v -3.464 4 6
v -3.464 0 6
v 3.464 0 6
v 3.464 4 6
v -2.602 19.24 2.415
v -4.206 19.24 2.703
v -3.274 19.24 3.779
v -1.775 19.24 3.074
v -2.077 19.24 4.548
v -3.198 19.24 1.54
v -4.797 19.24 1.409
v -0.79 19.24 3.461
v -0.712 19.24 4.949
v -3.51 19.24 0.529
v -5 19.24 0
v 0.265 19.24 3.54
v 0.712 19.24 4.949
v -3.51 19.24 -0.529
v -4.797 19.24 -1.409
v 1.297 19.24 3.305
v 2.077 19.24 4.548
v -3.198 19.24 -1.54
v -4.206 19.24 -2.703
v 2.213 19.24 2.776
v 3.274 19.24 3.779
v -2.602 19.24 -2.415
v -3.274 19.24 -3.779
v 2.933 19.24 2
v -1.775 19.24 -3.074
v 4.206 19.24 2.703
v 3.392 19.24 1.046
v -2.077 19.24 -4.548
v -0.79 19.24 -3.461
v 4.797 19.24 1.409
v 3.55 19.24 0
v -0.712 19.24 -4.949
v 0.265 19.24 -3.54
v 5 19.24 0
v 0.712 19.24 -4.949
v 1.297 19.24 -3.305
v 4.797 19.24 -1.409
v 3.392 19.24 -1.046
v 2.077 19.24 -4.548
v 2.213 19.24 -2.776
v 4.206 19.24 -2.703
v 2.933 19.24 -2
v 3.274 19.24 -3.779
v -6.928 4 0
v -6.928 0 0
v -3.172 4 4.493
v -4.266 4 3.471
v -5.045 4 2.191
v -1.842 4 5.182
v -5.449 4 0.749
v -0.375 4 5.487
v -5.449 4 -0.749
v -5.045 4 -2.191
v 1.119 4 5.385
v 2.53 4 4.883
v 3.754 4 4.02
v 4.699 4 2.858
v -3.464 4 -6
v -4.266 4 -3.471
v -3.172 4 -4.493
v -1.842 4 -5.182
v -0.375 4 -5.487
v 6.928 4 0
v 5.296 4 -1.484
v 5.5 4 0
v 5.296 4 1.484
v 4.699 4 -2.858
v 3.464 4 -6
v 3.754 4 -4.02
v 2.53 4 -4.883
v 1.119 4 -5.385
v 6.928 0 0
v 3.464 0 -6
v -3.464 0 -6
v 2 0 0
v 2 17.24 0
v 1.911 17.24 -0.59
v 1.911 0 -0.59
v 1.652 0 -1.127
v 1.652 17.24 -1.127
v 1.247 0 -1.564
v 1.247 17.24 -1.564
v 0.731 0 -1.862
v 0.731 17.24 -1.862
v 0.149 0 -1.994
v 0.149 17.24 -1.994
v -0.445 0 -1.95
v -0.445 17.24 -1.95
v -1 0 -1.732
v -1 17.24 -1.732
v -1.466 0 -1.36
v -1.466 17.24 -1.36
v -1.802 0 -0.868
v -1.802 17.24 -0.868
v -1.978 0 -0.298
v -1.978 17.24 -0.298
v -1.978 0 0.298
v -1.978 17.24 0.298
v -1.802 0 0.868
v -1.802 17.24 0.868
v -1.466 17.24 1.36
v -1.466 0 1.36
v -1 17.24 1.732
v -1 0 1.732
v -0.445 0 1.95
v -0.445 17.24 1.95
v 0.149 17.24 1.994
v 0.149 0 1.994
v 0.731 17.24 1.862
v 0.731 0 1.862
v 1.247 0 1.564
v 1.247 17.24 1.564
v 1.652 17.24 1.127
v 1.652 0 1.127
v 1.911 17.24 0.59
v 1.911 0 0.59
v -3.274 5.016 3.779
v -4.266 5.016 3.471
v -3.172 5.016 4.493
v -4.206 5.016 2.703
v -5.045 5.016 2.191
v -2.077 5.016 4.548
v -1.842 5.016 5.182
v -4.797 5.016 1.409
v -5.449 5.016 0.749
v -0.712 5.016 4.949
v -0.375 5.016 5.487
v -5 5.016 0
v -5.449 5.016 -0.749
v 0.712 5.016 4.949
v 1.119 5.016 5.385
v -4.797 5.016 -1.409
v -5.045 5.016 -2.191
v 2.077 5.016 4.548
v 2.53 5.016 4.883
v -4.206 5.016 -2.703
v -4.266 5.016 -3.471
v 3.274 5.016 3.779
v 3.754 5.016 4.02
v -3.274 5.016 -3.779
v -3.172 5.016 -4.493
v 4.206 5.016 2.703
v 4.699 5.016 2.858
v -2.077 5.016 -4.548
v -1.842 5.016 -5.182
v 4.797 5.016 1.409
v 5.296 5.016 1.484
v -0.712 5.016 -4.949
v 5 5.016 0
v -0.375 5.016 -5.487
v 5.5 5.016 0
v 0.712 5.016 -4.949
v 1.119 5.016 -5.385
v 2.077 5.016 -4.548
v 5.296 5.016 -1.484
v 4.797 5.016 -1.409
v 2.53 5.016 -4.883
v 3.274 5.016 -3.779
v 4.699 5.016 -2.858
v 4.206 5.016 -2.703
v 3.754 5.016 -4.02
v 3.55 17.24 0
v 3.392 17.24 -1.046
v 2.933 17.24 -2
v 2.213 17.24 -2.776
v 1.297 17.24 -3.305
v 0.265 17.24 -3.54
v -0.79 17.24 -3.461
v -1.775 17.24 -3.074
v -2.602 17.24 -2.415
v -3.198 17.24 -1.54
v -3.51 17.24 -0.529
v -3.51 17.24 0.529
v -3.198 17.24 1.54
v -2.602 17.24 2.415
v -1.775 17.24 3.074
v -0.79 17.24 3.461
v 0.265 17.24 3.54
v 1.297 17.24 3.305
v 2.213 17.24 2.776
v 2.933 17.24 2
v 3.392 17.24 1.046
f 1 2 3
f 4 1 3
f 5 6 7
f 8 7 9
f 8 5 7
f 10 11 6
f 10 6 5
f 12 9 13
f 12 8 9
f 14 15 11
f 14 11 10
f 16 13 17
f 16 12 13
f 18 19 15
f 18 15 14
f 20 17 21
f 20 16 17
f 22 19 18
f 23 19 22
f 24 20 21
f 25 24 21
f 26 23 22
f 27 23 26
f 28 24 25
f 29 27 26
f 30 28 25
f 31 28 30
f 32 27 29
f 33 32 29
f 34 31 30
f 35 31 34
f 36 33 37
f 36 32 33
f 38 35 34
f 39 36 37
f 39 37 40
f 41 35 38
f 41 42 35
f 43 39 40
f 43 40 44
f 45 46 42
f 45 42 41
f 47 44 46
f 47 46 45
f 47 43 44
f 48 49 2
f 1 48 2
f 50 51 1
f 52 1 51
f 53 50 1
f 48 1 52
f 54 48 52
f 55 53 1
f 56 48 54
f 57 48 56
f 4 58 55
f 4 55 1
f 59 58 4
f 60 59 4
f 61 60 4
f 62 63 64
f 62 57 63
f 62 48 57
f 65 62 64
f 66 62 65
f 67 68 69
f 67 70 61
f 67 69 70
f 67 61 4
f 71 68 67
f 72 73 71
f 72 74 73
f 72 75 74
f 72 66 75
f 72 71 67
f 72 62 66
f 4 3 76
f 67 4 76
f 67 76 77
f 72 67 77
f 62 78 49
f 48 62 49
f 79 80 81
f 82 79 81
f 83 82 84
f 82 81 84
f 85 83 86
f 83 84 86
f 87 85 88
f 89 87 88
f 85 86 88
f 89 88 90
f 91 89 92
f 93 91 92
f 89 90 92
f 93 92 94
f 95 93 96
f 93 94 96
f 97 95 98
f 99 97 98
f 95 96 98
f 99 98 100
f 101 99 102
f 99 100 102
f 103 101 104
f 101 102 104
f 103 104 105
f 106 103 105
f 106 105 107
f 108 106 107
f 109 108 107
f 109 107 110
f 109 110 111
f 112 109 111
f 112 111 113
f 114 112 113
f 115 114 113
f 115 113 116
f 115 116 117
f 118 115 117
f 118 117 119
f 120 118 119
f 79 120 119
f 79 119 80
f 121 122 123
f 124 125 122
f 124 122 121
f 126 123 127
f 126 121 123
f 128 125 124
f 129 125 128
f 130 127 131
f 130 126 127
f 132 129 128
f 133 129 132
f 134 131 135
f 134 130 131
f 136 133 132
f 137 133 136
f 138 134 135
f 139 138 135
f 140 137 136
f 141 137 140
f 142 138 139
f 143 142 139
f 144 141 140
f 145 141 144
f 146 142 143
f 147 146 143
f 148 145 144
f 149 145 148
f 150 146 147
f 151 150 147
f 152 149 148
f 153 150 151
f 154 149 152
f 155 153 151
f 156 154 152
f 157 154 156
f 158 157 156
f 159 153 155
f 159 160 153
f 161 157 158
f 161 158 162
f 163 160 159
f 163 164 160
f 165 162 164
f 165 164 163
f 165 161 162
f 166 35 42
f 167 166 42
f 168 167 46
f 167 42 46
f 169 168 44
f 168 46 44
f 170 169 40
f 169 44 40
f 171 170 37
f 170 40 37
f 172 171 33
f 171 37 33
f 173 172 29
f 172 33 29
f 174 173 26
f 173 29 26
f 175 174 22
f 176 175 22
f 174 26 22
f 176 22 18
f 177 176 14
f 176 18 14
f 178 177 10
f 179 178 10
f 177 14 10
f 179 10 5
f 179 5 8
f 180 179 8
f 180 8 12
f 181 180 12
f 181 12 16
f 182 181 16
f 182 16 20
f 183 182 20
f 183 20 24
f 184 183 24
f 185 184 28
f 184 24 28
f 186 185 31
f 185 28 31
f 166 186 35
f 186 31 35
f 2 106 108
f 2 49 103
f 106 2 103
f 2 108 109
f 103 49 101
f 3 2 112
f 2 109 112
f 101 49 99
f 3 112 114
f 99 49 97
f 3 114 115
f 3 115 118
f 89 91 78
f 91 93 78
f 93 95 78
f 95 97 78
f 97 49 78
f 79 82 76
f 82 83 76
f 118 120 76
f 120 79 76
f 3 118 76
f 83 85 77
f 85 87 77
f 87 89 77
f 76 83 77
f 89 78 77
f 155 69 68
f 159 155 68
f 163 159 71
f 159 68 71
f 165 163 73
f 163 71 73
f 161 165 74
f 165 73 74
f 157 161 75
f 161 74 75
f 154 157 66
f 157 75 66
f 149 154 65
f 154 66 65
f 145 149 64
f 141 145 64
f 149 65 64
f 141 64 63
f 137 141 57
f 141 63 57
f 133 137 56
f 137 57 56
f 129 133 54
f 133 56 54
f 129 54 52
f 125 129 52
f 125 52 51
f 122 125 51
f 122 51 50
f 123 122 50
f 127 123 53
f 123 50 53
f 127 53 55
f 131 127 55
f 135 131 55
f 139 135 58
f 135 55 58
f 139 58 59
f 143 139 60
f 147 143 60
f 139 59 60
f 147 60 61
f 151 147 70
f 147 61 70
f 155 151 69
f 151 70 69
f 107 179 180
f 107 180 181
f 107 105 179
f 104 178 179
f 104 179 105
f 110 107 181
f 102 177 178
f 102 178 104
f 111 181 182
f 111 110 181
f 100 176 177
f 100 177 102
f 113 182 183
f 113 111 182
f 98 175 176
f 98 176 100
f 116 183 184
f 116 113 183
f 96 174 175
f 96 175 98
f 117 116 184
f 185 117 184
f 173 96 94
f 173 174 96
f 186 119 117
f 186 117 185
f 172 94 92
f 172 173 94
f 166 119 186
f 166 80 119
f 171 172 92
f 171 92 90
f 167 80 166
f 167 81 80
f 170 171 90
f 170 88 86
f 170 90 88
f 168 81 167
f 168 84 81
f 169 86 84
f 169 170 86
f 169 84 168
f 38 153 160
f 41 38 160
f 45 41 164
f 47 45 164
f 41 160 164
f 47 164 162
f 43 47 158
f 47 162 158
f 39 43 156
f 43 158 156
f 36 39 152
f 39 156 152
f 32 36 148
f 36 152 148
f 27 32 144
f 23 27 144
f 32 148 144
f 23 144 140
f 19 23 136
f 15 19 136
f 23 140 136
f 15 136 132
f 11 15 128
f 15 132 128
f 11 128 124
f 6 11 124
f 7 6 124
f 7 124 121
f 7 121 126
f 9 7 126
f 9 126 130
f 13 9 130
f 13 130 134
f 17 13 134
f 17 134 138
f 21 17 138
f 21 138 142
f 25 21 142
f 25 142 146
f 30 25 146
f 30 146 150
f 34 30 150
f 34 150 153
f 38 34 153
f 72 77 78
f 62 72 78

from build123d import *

# Parameters (mm, degrees)
BOSS_EXTRUDE1_DEPTH = 4
SKETCH2_R           = 5.500000049
SKETCH2_R_2         = 5.000000033
BOSS_EXTRUDE2_DEPTH = 1.016
SKETCH2_2_R         = 5.000000033
BOSS_EXTRUDE3_DEPTH = 15.24
SKETCH4_R           = 2.000000064
CUT_EXTRUDE2_DEPTH  = 20.24
SKETCH4_3_R         = 3.55
SKETCH4_3_R_2       = 2.000000064
CUT_EXTRUDE3_DEPTH  = 2


with BuildPart() as part:
    # Sketch1 → Boss-Extrude1 (new body)
    with BuildSketch(Plane(origin=(0, 0, 0), x_dir=(1, 0, 0), z_dir=(0, 1, 0))):
        Polygon((3.464101615, 6), (-3.464101615, 6), (-6.92820323, 0), (-3.464101615, -6), (3.464101615, -6), (6.92820323, 0), align=None)
    extrude(amount=BOSS_EXTRUDE1_DEPTH)

    # Sketch2 → Boss-Extrude2 (add)
    with BuildSketch(Plane(origin=(0, 4, 0), x_dir=(1, 0, 0), z_dir=(0, 1, 0))):
        Circle(SKETCH2_R)
        Circle(SKETCH2_R_2, mode=Mode.SUBTRACT)
    extrude(amount=BOSS_EXTRUDE2_DEPTH)

    # Sketch2<2> → Boss-Extrude3 (add)
    with BuildSketch(Plane(origin=(0, 4, 0), x_dir=(1, 0, 0), z_dir=(0, 1, 0))):
        Circle(SKETCH2_2_R)
    extrude(amount=BOSS_EXTRUDE3_DEPTH)

    # Sketch4 → Cut-Extrude2 (cut, through all)
    with BuildSketch(Plane(origin=(0, 19.24, 0), x_dir=(1, 0, 0), z_dir=(0, 1, 0))):
        Circle(SKETCH4_R)
    extrude(amount=-CUT_EXTRUDE2_DEPTH, mode=Mode.SUBTRACT)

    # Sketch4<3> → Cut-Extrude3 (cut)
    with BuildSketch(Plane(origin=(0, 19.24, 0), x_dir=(1, 0, 0), z_dir=(0, 1, 0))):
        Circle(SKETCH4_3_R)
        Circle(SKETCH4_3_R_2, mode=Mode.SUBTRACT)
    extrude(amount=-CUT_EXTRUDE3_DEPTH, mode=Mode.SUBTRACT)


solid = part.part
